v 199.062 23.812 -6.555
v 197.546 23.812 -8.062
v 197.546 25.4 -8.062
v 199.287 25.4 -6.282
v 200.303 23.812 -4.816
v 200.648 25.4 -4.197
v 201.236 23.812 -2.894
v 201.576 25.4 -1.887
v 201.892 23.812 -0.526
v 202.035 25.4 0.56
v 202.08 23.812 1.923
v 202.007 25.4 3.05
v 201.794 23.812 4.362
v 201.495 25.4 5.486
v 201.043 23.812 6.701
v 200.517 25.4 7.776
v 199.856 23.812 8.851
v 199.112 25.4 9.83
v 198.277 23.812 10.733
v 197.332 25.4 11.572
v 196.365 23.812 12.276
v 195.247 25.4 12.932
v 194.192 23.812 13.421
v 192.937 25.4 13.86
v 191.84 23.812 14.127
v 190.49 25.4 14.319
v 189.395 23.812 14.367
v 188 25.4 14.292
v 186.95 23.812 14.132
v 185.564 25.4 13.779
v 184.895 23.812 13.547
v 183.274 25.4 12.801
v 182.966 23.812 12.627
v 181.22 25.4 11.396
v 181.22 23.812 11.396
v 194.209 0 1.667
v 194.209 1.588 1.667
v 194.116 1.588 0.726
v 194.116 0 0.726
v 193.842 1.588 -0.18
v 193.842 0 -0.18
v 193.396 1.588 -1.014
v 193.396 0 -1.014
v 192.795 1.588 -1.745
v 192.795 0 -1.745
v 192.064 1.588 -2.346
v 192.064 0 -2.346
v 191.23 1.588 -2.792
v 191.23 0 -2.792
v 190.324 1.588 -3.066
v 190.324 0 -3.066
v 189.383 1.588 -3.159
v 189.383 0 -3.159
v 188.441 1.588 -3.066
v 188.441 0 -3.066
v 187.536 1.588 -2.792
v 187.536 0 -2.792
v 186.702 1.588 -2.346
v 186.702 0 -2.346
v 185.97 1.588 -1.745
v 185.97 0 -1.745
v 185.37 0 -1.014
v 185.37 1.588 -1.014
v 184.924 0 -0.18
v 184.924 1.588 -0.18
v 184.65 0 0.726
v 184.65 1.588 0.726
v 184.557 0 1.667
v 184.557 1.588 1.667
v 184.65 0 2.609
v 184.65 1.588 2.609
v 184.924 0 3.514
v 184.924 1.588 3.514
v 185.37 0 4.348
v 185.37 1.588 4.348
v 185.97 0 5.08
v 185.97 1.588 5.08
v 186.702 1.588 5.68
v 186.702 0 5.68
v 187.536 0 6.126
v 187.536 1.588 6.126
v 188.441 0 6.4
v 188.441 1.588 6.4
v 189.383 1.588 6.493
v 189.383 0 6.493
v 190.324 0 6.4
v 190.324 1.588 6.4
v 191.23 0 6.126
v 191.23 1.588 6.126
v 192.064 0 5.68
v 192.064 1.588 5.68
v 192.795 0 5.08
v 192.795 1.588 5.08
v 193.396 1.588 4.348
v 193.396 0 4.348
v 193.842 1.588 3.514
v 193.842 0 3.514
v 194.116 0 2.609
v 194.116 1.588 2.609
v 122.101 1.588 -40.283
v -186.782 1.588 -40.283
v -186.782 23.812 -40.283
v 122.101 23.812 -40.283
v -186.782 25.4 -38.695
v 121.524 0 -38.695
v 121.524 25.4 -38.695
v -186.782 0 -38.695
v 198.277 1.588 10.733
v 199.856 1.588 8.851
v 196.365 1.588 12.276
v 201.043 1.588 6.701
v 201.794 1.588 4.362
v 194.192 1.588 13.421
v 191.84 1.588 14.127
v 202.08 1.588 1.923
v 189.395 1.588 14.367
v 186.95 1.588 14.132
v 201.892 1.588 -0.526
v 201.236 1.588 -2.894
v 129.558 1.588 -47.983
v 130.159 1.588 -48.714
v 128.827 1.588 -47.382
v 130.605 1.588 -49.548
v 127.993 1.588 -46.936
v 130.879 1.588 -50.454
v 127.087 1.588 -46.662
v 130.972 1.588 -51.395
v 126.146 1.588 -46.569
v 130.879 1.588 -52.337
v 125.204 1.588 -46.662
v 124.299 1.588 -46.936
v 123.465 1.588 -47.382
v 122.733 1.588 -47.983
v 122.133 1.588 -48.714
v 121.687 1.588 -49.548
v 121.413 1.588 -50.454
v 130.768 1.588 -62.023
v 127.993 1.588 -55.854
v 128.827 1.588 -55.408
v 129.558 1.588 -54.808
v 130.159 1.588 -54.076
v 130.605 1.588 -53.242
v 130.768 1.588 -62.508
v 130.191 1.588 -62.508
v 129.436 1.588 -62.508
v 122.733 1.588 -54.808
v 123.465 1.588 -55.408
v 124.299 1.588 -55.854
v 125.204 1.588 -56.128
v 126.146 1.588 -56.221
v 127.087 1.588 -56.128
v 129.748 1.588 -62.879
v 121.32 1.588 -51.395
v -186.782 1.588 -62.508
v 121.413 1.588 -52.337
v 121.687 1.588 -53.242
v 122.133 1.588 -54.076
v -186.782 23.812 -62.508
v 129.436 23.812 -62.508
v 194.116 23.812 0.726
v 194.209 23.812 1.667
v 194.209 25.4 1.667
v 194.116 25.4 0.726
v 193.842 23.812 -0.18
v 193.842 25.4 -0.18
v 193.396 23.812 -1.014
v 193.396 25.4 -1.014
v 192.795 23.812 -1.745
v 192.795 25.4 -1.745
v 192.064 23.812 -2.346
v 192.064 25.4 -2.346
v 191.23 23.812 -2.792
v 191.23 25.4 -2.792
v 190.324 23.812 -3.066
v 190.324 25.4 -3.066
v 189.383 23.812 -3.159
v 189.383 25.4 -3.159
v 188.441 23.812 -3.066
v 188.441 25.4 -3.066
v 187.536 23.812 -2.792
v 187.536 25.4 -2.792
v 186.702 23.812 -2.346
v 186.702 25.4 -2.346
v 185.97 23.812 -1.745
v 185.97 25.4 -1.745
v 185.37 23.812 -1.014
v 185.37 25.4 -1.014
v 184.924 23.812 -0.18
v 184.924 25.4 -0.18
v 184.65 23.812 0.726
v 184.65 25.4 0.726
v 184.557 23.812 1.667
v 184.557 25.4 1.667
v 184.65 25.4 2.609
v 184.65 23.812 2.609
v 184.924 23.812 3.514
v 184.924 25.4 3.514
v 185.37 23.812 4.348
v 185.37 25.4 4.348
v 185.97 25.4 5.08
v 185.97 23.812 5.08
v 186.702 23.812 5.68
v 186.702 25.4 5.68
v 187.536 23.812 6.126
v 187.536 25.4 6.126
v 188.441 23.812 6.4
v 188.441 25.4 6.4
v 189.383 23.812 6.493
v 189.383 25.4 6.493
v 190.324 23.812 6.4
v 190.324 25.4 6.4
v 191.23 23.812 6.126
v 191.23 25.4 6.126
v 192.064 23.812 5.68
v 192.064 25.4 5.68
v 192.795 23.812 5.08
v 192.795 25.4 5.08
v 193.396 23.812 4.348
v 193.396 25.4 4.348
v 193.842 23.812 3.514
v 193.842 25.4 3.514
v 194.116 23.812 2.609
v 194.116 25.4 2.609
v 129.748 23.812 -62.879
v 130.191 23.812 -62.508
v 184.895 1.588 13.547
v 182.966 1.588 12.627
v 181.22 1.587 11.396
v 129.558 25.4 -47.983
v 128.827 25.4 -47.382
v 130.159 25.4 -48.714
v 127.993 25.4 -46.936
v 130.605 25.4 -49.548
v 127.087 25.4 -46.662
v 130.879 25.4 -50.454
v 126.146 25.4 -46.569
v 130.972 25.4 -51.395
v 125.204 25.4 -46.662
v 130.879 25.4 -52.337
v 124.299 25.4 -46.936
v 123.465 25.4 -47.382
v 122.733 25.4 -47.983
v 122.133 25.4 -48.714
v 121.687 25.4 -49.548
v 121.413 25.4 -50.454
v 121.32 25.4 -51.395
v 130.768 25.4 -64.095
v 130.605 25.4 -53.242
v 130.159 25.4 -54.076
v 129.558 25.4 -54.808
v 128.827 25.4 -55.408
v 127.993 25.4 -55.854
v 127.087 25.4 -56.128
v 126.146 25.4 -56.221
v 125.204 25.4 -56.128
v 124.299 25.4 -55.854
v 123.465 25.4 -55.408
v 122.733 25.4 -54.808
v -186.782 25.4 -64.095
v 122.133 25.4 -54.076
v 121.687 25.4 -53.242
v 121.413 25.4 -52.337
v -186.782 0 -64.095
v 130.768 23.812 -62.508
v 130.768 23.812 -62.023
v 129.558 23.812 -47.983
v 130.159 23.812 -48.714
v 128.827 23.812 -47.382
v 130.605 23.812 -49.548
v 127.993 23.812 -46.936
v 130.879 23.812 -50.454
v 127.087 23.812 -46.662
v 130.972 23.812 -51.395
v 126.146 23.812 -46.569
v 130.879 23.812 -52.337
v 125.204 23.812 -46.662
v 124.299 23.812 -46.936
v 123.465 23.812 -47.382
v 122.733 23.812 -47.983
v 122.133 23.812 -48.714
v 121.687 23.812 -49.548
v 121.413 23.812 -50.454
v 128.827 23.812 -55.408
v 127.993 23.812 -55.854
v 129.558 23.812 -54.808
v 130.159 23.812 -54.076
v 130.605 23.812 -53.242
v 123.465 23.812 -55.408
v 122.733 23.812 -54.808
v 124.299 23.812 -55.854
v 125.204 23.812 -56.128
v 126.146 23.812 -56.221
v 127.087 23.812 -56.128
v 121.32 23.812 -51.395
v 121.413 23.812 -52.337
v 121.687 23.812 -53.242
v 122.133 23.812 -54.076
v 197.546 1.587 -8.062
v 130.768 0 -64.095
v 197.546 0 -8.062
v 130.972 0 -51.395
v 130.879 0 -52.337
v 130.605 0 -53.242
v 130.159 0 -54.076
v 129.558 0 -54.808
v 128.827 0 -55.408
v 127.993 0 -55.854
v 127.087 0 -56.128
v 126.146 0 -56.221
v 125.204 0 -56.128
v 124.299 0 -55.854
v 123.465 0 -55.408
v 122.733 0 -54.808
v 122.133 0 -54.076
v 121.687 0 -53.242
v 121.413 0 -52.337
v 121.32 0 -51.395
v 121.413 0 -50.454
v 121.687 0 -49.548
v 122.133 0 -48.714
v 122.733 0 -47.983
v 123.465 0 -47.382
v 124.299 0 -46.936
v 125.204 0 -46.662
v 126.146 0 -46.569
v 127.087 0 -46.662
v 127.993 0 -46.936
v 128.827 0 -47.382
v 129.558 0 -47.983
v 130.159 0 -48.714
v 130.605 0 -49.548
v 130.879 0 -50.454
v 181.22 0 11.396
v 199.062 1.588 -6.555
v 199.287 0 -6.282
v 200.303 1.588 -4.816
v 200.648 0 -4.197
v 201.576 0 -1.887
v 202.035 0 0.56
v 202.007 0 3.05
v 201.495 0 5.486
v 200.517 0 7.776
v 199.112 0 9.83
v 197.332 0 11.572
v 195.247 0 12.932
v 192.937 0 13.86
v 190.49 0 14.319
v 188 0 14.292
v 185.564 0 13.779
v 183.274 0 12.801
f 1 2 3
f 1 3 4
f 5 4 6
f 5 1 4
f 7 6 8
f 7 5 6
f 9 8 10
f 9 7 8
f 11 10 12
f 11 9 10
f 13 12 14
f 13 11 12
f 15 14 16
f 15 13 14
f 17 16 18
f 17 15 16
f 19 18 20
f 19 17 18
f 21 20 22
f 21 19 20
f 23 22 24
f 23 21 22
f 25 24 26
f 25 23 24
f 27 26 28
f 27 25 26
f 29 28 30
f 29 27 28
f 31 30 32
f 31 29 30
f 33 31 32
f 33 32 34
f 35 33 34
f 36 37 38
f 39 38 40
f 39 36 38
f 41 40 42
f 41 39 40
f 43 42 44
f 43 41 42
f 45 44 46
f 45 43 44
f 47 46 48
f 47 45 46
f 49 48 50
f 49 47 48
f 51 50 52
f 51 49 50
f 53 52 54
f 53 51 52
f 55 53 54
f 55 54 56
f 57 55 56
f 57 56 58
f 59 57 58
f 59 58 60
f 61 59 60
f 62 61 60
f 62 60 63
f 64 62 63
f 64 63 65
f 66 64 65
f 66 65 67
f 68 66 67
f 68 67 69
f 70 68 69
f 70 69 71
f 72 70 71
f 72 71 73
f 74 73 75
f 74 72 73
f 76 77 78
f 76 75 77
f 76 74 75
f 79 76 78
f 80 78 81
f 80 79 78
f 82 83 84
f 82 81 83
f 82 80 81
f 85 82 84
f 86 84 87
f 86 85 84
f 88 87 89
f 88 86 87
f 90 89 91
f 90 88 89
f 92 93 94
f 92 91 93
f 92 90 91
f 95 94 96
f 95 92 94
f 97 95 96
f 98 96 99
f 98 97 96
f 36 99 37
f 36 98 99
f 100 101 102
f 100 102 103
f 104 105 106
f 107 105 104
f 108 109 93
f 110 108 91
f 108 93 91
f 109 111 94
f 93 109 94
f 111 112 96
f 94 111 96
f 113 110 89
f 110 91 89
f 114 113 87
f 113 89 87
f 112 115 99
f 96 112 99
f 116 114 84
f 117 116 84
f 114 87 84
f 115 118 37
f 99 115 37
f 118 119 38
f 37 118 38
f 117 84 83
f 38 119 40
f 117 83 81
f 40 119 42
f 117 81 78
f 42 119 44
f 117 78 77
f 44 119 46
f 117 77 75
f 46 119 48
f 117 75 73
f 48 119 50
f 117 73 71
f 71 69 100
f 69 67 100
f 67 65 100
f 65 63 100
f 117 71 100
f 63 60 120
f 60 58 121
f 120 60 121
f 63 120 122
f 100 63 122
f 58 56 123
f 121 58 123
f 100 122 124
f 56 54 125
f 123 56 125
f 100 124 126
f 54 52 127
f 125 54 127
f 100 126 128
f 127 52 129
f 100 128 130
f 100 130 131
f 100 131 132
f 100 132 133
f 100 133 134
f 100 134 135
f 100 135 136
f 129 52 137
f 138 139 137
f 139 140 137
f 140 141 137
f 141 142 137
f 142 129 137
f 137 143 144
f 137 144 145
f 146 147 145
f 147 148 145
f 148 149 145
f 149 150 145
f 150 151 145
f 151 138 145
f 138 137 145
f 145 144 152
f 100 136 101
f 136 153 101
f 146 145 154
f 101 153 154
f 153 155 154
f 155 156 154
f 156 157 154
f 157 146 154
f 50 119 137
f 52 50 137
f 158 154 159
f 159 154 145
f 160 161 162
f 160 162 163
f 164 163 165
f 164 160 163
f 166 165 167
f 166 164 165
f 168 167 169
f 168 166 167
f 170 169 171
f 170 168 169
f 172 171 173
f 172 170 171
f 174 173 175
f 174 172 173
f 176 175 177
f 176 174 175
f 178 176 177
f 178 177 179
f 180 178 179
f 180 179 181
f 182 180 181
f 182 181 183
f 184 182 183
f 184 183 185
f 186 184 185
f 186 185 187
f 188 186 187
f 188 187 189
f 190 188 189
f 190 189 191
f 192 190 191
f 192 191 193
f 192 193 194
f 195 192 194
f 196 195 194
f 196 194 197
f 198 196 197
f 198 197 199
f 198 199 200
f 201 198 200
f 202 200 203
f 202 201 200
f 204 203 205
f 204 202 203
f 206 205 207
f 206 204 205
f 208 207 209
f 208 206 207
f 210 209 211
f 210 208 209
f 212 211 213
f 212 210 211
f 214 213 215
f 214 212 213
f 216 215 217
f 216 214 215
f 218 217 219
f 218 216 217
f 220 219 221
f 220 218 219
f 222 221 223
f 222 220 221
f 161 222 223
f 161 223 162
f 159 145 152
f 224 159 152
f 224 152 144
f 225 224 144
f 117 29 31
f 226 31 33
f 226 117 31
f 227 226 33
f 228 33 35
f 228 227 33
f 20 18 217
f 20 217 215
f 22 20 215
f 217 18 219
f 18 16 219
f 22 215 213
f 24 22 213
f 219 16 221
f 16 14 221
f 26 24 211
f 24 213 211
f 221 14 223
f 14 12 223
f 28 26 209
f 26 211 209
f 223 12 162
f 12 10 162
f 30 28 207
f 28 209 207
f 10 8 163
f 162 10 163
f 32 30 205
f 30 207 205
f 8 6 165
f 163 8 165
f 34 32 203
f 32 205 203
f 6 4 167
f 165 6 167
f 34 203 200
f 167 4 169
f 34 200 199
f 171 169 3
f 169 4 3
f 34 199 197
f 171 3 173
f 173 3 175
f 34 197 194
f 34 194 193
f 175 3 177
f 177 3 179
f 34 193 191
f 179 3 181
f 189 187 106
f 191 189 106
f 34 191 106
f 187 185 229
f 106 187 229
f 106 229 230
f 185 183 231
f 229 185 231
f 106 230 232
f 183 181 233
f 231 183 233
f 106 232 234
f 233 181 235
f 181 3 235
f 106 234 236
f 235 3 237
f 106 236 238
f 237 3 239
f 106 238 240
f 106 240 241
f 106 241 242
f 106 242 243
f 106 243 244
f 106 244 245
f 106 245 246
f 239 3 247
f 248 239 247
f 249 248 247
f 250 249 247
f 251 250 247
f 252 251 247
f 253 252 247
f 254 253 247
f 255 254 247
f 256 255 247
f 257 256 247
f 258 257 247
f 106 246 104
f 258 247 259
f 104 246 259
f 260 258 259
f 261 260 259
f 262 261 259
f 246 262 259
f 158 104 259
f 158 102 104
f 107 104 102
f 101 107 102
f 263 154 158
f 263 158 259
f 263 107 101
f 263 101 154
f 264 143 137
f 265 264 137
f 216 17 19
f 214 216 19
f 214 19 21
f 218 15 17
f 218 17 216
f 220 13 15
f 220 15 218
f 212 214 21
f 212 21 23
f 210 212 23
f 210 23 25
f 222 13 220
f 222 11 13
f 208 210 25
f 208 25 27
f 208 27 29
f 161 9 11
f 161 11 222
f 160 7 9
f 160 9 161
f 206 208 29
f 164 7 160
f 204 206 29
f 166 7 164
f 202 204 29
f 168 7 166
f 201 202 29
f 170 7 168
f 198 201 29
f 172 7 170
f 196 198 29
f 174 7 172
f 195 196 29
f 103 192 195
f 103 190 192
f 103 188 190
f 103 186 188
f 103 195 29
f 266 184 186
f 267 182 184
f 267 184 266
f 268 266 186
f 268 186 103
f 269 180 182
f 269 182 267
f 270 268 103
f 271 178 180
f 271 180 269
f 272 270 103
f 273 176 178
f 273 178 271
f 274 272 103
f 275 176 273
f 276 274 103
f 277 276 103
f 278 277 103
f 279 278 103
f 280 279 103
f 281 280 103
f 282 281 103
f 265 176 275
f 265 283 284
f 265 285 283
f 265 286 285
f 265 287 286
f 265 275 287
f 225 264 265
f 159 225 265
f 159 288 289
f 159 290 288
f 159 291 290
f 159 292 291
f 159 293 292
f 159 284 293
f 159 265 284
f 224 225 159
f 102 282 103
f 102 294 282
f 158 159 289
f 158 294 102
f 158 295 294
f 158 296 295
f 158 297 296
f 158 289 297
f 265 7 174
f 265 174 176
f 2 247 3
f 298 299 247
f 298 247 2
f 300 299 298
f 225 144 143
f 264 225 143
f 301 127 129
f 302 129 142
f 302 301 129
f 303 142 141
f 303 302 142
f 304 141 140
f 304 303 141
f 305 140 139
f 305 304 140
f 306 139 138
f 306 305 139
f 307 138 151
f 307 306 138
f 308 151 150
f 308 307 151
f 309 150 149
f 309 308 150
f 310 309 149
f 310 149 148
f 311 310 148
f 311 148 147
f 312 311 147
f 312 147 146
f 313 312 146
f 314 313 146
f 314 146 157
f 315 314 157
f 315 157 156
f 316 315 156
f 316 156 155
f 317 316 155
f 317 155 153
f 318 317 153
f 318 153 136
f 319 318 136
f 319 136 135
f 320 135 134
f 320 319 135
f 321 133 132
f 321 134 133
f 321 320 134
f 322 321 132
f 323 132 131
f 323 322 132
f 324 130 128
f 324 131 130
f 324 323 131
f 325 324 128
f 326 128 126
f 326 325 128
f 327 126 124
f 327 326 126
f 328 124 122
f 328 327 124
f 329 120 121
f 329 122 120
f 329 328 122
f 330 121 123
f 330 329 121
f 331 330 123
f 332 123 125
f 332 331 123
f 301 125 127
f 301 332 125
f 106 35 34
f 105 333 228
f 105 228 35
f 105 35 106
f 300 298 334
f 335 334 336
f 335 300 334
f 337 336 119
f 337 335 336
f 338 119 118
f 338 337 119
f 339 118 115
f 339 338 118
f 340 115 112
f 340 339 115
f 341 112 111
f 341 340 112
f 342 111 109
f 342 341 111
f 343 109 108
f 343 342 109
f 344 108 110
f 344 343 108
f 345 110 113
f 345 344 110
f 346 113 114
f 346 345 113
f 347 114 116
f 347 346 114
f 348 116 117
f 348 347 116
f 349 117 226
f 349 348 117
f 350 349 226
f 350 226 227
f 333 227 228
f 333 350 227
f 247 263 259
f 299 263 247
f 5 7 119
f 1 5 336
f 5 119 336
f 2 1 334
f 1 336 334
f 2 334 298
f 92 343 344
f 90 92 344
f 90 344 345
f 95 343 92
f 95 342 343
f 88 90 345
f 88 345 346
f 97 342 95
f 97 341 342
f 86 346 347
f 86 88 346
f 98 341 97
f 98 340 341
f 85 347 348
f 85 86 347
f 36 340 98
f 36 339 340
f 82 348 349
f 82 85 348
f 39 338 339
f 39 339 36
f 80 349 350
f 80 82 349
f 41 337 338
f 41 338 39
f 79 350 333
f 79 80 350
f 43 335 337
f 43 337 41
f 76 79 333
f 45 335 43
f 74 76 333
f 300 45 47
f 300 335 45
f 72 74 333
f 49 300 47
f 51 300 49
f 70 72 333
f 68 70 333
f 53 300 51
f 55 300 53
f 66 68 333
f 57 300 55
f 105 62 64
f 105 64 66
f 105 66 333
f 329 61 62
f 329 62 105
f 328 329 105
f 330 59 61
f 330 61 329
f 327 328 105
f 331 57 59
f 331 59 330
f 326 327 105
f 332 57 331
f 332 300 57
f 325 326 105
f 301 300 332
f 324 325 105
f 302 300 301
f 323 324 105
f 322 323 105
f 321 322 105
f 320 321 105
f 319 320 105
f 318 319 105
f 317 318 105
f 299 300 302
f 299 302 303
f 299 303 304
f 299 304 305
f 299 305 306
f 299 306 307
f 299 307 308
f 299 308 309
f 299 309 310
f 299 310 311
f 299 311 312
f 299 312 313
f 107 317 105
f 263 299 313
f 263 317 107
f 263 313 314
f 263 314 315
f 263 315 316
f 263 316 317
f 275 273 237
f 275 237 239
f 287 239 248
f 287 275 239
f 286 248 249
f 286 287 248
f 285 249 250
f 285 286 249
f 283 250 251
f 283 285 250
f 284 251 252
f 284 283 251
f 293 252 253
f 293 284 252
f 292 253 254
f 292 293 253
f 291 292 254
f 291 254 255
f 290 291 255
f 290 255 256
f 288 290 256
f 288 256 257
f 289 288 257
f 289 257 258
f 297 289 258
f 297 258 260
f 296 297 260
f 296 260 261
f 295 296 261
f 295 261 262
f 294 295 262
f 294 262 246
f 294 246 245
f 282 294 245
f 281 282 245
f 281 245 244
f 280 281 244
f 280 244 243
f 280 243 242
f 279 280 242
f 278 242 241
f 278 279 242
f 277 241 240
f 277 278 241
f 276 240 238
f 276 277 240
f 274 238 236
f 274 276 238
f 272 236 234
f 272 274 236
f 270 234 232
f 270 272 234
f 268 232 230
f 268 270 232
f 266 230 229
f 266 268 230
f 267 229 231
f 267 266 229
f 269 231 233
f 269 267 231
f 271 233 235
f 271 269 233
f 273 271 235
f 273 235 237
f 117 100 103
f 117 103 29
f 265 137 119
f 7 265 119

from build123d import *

# Parameters (mm, degrees)
BOSS_EXTRUDE1_DEPTH = 1.5875
BOSS_EXTRUDE2_DEPTH = 22.225
BOSS_EXTRUDE3_DEPTH = 22.225
BOSS_EXTRUDE4_DEPTH = 1.5875
HOLE1_OUTLINE_R     = 4.826
HOLE1_DEPTH         = 25.4
HOLE2_OUTLINE_R     = 4.826
HOLE2_DEPTH         = 25.4


# Read off the part's stored shape, not the designer's step: Hole1, Hole2
with BuildPart() as part:
    # Sketch4 → Boss-Extrude1 (new body)
    with BuildSketch(Plane(origin=(0, 0, 0), x_dir=(1, 0, 0), z_dir=(0, 1, 0))):
        with BuildLine():
            Line((121.523565154, 38.695091361), (-186.782012798, 38.695091361))
            Line((-186.782012798, 38.695091361), (-186.782012798, 64.095091361))
            Line((-186.782012798, 64.095091361), (130.76840925, 64.095091361))
            Line((130.76840925, 64.095091361), (197.546358654, 8.061738645))
            ThreePointArc((197.546358654, 8.061738645), (199.111720445, -9.830428491), (181.219553308, -11.395790282))
            Line((181.219553308, -11.395790282), (121.523565154, 38.695091361))
        make_face()
    extrude(amount=BOSS_EXTRUDE1_DEPTH)

    # Sketch5 → Boss-Extrude2 (add)
    with BuildSketch(Plane(origin=(0, 1.5875, 0), x_dir=(1, 0, 0), z_dir=(0, 1, 0))):
        with BuildLine():
            Line((-186.782012798, 64.095091361), (-186.782012798, 62.507591361))
            Line((-186.782012798, 62.507591361), (129.436338508, 62.507591361))
            Line((129.436338508, 62.507591361), (129.74798387, 62.878995842))
            Line((129.74798387, 62.878995842), (130.190606494, 62.507591361))
            Line((130.190606494, 62.507591361), (130.768409293, 62.507591361))
            Line((130.768409293, 62.507591361), (130.768409293, 62.022757246))
            Line((130.768409293, 62.022757246), (201.235851163, 2.893552762))
            ThreePointArc((201.235851163, 2.893552762), (199.719327747, 5.7119592), (197.546358654, 8.061738645))
            Line((197.546358654, 8.061738645), (130.76840925, 64.095091361))
            Line((130.76840925, 64.095091361), (-186.782012798, 64.095091361))
        make_face()
    extrude(amount=BOSS_EXTRUDE2_DEPTH)

    # Sketch7 → Boss-Extrude3 (add)
    with BuildSketch(Plane(origin=(0, 1.5875, 0), x_dir=(1, 0, 0), z_dir=(0, 1, 0))):
        with BuildLine():
            Line((-186.782012798, 38.695091361), (-186.782012798, 40.282591361))
            Line((-186.782012798, 40.282591361), (122.10136791, 40.282591361))
            Line((122.10136791, 40.282591361), (186.949896399, -14.131784976))
            ThreePointArc((186.949896399, -14.131784976), (183.910966405, -13.127712138), (181.219553308, -11.395790282))
            Line((181.219553308, -11.395790282), (121.523565154, 38.695091361))
            Line((121.523565154, 38.695091361), (-186.782012798, 38.695091361))
        make_face()
    extrude(amount=BOSS_EXTRUDE3_DEPTH)

    # Sketch8 → Boss-Extrude4 (add)
    with BuildSketch(Plane(origin=(0, 23.8125, 0), x_dir=(1, 0, 0), z_dir=(0, 1, 0))):
        with BuildLine():
            Line((121.523565154, 38.695091361), (-186.782012798, 38.695091361))
            Line((-186.782012798, 38.695091361), (-186.782012798, 64.095091361))
            Line((-186.782012798, 64.095091361), (130.76840925, 64.095091361))
            Line((130.76840925, 64.095091361), (197.546358654, 8.061738645))
            ThreePointArc((197.546358654, 8.061738645), (199.111720445, -9.830428491), (181.219553308, -11.395790282))
            Line((181.219553308, -11.395790282), (121.523565154, 38.695091361))
        make_face()
    extrude(amount=BOSS_EXTRUDE4_DEPTH)

    # Hole1 outline → Hole1 (cut)
    with BuildSketch(Plane(origin=(0, 0, 0), x_dir=(1, 0, 0), z_dir=(0, 1, 0))):
        with Locations((189.382955981, -1.667025818)):
            Circle(HOLE1_OUTLINE_R)
    extrude(amount=HOLE1_DEPTH, mode=Mode.SUBTRACT)

    # Hole2 outline → Hole2 (cut)
    with BuildSketch(Plane(origin=(0, 0, 0), x_dir=(1, 0, 0), z_dir=(0, 1, 0))):
        with Locations((126.145987202, 51.395091361)):
            Circle(HOLE2_OUTLINE_R)
    extrude(amount=HOLE2_DEPTH, mode=Mode.SUBTRACT)


solid = part.part
